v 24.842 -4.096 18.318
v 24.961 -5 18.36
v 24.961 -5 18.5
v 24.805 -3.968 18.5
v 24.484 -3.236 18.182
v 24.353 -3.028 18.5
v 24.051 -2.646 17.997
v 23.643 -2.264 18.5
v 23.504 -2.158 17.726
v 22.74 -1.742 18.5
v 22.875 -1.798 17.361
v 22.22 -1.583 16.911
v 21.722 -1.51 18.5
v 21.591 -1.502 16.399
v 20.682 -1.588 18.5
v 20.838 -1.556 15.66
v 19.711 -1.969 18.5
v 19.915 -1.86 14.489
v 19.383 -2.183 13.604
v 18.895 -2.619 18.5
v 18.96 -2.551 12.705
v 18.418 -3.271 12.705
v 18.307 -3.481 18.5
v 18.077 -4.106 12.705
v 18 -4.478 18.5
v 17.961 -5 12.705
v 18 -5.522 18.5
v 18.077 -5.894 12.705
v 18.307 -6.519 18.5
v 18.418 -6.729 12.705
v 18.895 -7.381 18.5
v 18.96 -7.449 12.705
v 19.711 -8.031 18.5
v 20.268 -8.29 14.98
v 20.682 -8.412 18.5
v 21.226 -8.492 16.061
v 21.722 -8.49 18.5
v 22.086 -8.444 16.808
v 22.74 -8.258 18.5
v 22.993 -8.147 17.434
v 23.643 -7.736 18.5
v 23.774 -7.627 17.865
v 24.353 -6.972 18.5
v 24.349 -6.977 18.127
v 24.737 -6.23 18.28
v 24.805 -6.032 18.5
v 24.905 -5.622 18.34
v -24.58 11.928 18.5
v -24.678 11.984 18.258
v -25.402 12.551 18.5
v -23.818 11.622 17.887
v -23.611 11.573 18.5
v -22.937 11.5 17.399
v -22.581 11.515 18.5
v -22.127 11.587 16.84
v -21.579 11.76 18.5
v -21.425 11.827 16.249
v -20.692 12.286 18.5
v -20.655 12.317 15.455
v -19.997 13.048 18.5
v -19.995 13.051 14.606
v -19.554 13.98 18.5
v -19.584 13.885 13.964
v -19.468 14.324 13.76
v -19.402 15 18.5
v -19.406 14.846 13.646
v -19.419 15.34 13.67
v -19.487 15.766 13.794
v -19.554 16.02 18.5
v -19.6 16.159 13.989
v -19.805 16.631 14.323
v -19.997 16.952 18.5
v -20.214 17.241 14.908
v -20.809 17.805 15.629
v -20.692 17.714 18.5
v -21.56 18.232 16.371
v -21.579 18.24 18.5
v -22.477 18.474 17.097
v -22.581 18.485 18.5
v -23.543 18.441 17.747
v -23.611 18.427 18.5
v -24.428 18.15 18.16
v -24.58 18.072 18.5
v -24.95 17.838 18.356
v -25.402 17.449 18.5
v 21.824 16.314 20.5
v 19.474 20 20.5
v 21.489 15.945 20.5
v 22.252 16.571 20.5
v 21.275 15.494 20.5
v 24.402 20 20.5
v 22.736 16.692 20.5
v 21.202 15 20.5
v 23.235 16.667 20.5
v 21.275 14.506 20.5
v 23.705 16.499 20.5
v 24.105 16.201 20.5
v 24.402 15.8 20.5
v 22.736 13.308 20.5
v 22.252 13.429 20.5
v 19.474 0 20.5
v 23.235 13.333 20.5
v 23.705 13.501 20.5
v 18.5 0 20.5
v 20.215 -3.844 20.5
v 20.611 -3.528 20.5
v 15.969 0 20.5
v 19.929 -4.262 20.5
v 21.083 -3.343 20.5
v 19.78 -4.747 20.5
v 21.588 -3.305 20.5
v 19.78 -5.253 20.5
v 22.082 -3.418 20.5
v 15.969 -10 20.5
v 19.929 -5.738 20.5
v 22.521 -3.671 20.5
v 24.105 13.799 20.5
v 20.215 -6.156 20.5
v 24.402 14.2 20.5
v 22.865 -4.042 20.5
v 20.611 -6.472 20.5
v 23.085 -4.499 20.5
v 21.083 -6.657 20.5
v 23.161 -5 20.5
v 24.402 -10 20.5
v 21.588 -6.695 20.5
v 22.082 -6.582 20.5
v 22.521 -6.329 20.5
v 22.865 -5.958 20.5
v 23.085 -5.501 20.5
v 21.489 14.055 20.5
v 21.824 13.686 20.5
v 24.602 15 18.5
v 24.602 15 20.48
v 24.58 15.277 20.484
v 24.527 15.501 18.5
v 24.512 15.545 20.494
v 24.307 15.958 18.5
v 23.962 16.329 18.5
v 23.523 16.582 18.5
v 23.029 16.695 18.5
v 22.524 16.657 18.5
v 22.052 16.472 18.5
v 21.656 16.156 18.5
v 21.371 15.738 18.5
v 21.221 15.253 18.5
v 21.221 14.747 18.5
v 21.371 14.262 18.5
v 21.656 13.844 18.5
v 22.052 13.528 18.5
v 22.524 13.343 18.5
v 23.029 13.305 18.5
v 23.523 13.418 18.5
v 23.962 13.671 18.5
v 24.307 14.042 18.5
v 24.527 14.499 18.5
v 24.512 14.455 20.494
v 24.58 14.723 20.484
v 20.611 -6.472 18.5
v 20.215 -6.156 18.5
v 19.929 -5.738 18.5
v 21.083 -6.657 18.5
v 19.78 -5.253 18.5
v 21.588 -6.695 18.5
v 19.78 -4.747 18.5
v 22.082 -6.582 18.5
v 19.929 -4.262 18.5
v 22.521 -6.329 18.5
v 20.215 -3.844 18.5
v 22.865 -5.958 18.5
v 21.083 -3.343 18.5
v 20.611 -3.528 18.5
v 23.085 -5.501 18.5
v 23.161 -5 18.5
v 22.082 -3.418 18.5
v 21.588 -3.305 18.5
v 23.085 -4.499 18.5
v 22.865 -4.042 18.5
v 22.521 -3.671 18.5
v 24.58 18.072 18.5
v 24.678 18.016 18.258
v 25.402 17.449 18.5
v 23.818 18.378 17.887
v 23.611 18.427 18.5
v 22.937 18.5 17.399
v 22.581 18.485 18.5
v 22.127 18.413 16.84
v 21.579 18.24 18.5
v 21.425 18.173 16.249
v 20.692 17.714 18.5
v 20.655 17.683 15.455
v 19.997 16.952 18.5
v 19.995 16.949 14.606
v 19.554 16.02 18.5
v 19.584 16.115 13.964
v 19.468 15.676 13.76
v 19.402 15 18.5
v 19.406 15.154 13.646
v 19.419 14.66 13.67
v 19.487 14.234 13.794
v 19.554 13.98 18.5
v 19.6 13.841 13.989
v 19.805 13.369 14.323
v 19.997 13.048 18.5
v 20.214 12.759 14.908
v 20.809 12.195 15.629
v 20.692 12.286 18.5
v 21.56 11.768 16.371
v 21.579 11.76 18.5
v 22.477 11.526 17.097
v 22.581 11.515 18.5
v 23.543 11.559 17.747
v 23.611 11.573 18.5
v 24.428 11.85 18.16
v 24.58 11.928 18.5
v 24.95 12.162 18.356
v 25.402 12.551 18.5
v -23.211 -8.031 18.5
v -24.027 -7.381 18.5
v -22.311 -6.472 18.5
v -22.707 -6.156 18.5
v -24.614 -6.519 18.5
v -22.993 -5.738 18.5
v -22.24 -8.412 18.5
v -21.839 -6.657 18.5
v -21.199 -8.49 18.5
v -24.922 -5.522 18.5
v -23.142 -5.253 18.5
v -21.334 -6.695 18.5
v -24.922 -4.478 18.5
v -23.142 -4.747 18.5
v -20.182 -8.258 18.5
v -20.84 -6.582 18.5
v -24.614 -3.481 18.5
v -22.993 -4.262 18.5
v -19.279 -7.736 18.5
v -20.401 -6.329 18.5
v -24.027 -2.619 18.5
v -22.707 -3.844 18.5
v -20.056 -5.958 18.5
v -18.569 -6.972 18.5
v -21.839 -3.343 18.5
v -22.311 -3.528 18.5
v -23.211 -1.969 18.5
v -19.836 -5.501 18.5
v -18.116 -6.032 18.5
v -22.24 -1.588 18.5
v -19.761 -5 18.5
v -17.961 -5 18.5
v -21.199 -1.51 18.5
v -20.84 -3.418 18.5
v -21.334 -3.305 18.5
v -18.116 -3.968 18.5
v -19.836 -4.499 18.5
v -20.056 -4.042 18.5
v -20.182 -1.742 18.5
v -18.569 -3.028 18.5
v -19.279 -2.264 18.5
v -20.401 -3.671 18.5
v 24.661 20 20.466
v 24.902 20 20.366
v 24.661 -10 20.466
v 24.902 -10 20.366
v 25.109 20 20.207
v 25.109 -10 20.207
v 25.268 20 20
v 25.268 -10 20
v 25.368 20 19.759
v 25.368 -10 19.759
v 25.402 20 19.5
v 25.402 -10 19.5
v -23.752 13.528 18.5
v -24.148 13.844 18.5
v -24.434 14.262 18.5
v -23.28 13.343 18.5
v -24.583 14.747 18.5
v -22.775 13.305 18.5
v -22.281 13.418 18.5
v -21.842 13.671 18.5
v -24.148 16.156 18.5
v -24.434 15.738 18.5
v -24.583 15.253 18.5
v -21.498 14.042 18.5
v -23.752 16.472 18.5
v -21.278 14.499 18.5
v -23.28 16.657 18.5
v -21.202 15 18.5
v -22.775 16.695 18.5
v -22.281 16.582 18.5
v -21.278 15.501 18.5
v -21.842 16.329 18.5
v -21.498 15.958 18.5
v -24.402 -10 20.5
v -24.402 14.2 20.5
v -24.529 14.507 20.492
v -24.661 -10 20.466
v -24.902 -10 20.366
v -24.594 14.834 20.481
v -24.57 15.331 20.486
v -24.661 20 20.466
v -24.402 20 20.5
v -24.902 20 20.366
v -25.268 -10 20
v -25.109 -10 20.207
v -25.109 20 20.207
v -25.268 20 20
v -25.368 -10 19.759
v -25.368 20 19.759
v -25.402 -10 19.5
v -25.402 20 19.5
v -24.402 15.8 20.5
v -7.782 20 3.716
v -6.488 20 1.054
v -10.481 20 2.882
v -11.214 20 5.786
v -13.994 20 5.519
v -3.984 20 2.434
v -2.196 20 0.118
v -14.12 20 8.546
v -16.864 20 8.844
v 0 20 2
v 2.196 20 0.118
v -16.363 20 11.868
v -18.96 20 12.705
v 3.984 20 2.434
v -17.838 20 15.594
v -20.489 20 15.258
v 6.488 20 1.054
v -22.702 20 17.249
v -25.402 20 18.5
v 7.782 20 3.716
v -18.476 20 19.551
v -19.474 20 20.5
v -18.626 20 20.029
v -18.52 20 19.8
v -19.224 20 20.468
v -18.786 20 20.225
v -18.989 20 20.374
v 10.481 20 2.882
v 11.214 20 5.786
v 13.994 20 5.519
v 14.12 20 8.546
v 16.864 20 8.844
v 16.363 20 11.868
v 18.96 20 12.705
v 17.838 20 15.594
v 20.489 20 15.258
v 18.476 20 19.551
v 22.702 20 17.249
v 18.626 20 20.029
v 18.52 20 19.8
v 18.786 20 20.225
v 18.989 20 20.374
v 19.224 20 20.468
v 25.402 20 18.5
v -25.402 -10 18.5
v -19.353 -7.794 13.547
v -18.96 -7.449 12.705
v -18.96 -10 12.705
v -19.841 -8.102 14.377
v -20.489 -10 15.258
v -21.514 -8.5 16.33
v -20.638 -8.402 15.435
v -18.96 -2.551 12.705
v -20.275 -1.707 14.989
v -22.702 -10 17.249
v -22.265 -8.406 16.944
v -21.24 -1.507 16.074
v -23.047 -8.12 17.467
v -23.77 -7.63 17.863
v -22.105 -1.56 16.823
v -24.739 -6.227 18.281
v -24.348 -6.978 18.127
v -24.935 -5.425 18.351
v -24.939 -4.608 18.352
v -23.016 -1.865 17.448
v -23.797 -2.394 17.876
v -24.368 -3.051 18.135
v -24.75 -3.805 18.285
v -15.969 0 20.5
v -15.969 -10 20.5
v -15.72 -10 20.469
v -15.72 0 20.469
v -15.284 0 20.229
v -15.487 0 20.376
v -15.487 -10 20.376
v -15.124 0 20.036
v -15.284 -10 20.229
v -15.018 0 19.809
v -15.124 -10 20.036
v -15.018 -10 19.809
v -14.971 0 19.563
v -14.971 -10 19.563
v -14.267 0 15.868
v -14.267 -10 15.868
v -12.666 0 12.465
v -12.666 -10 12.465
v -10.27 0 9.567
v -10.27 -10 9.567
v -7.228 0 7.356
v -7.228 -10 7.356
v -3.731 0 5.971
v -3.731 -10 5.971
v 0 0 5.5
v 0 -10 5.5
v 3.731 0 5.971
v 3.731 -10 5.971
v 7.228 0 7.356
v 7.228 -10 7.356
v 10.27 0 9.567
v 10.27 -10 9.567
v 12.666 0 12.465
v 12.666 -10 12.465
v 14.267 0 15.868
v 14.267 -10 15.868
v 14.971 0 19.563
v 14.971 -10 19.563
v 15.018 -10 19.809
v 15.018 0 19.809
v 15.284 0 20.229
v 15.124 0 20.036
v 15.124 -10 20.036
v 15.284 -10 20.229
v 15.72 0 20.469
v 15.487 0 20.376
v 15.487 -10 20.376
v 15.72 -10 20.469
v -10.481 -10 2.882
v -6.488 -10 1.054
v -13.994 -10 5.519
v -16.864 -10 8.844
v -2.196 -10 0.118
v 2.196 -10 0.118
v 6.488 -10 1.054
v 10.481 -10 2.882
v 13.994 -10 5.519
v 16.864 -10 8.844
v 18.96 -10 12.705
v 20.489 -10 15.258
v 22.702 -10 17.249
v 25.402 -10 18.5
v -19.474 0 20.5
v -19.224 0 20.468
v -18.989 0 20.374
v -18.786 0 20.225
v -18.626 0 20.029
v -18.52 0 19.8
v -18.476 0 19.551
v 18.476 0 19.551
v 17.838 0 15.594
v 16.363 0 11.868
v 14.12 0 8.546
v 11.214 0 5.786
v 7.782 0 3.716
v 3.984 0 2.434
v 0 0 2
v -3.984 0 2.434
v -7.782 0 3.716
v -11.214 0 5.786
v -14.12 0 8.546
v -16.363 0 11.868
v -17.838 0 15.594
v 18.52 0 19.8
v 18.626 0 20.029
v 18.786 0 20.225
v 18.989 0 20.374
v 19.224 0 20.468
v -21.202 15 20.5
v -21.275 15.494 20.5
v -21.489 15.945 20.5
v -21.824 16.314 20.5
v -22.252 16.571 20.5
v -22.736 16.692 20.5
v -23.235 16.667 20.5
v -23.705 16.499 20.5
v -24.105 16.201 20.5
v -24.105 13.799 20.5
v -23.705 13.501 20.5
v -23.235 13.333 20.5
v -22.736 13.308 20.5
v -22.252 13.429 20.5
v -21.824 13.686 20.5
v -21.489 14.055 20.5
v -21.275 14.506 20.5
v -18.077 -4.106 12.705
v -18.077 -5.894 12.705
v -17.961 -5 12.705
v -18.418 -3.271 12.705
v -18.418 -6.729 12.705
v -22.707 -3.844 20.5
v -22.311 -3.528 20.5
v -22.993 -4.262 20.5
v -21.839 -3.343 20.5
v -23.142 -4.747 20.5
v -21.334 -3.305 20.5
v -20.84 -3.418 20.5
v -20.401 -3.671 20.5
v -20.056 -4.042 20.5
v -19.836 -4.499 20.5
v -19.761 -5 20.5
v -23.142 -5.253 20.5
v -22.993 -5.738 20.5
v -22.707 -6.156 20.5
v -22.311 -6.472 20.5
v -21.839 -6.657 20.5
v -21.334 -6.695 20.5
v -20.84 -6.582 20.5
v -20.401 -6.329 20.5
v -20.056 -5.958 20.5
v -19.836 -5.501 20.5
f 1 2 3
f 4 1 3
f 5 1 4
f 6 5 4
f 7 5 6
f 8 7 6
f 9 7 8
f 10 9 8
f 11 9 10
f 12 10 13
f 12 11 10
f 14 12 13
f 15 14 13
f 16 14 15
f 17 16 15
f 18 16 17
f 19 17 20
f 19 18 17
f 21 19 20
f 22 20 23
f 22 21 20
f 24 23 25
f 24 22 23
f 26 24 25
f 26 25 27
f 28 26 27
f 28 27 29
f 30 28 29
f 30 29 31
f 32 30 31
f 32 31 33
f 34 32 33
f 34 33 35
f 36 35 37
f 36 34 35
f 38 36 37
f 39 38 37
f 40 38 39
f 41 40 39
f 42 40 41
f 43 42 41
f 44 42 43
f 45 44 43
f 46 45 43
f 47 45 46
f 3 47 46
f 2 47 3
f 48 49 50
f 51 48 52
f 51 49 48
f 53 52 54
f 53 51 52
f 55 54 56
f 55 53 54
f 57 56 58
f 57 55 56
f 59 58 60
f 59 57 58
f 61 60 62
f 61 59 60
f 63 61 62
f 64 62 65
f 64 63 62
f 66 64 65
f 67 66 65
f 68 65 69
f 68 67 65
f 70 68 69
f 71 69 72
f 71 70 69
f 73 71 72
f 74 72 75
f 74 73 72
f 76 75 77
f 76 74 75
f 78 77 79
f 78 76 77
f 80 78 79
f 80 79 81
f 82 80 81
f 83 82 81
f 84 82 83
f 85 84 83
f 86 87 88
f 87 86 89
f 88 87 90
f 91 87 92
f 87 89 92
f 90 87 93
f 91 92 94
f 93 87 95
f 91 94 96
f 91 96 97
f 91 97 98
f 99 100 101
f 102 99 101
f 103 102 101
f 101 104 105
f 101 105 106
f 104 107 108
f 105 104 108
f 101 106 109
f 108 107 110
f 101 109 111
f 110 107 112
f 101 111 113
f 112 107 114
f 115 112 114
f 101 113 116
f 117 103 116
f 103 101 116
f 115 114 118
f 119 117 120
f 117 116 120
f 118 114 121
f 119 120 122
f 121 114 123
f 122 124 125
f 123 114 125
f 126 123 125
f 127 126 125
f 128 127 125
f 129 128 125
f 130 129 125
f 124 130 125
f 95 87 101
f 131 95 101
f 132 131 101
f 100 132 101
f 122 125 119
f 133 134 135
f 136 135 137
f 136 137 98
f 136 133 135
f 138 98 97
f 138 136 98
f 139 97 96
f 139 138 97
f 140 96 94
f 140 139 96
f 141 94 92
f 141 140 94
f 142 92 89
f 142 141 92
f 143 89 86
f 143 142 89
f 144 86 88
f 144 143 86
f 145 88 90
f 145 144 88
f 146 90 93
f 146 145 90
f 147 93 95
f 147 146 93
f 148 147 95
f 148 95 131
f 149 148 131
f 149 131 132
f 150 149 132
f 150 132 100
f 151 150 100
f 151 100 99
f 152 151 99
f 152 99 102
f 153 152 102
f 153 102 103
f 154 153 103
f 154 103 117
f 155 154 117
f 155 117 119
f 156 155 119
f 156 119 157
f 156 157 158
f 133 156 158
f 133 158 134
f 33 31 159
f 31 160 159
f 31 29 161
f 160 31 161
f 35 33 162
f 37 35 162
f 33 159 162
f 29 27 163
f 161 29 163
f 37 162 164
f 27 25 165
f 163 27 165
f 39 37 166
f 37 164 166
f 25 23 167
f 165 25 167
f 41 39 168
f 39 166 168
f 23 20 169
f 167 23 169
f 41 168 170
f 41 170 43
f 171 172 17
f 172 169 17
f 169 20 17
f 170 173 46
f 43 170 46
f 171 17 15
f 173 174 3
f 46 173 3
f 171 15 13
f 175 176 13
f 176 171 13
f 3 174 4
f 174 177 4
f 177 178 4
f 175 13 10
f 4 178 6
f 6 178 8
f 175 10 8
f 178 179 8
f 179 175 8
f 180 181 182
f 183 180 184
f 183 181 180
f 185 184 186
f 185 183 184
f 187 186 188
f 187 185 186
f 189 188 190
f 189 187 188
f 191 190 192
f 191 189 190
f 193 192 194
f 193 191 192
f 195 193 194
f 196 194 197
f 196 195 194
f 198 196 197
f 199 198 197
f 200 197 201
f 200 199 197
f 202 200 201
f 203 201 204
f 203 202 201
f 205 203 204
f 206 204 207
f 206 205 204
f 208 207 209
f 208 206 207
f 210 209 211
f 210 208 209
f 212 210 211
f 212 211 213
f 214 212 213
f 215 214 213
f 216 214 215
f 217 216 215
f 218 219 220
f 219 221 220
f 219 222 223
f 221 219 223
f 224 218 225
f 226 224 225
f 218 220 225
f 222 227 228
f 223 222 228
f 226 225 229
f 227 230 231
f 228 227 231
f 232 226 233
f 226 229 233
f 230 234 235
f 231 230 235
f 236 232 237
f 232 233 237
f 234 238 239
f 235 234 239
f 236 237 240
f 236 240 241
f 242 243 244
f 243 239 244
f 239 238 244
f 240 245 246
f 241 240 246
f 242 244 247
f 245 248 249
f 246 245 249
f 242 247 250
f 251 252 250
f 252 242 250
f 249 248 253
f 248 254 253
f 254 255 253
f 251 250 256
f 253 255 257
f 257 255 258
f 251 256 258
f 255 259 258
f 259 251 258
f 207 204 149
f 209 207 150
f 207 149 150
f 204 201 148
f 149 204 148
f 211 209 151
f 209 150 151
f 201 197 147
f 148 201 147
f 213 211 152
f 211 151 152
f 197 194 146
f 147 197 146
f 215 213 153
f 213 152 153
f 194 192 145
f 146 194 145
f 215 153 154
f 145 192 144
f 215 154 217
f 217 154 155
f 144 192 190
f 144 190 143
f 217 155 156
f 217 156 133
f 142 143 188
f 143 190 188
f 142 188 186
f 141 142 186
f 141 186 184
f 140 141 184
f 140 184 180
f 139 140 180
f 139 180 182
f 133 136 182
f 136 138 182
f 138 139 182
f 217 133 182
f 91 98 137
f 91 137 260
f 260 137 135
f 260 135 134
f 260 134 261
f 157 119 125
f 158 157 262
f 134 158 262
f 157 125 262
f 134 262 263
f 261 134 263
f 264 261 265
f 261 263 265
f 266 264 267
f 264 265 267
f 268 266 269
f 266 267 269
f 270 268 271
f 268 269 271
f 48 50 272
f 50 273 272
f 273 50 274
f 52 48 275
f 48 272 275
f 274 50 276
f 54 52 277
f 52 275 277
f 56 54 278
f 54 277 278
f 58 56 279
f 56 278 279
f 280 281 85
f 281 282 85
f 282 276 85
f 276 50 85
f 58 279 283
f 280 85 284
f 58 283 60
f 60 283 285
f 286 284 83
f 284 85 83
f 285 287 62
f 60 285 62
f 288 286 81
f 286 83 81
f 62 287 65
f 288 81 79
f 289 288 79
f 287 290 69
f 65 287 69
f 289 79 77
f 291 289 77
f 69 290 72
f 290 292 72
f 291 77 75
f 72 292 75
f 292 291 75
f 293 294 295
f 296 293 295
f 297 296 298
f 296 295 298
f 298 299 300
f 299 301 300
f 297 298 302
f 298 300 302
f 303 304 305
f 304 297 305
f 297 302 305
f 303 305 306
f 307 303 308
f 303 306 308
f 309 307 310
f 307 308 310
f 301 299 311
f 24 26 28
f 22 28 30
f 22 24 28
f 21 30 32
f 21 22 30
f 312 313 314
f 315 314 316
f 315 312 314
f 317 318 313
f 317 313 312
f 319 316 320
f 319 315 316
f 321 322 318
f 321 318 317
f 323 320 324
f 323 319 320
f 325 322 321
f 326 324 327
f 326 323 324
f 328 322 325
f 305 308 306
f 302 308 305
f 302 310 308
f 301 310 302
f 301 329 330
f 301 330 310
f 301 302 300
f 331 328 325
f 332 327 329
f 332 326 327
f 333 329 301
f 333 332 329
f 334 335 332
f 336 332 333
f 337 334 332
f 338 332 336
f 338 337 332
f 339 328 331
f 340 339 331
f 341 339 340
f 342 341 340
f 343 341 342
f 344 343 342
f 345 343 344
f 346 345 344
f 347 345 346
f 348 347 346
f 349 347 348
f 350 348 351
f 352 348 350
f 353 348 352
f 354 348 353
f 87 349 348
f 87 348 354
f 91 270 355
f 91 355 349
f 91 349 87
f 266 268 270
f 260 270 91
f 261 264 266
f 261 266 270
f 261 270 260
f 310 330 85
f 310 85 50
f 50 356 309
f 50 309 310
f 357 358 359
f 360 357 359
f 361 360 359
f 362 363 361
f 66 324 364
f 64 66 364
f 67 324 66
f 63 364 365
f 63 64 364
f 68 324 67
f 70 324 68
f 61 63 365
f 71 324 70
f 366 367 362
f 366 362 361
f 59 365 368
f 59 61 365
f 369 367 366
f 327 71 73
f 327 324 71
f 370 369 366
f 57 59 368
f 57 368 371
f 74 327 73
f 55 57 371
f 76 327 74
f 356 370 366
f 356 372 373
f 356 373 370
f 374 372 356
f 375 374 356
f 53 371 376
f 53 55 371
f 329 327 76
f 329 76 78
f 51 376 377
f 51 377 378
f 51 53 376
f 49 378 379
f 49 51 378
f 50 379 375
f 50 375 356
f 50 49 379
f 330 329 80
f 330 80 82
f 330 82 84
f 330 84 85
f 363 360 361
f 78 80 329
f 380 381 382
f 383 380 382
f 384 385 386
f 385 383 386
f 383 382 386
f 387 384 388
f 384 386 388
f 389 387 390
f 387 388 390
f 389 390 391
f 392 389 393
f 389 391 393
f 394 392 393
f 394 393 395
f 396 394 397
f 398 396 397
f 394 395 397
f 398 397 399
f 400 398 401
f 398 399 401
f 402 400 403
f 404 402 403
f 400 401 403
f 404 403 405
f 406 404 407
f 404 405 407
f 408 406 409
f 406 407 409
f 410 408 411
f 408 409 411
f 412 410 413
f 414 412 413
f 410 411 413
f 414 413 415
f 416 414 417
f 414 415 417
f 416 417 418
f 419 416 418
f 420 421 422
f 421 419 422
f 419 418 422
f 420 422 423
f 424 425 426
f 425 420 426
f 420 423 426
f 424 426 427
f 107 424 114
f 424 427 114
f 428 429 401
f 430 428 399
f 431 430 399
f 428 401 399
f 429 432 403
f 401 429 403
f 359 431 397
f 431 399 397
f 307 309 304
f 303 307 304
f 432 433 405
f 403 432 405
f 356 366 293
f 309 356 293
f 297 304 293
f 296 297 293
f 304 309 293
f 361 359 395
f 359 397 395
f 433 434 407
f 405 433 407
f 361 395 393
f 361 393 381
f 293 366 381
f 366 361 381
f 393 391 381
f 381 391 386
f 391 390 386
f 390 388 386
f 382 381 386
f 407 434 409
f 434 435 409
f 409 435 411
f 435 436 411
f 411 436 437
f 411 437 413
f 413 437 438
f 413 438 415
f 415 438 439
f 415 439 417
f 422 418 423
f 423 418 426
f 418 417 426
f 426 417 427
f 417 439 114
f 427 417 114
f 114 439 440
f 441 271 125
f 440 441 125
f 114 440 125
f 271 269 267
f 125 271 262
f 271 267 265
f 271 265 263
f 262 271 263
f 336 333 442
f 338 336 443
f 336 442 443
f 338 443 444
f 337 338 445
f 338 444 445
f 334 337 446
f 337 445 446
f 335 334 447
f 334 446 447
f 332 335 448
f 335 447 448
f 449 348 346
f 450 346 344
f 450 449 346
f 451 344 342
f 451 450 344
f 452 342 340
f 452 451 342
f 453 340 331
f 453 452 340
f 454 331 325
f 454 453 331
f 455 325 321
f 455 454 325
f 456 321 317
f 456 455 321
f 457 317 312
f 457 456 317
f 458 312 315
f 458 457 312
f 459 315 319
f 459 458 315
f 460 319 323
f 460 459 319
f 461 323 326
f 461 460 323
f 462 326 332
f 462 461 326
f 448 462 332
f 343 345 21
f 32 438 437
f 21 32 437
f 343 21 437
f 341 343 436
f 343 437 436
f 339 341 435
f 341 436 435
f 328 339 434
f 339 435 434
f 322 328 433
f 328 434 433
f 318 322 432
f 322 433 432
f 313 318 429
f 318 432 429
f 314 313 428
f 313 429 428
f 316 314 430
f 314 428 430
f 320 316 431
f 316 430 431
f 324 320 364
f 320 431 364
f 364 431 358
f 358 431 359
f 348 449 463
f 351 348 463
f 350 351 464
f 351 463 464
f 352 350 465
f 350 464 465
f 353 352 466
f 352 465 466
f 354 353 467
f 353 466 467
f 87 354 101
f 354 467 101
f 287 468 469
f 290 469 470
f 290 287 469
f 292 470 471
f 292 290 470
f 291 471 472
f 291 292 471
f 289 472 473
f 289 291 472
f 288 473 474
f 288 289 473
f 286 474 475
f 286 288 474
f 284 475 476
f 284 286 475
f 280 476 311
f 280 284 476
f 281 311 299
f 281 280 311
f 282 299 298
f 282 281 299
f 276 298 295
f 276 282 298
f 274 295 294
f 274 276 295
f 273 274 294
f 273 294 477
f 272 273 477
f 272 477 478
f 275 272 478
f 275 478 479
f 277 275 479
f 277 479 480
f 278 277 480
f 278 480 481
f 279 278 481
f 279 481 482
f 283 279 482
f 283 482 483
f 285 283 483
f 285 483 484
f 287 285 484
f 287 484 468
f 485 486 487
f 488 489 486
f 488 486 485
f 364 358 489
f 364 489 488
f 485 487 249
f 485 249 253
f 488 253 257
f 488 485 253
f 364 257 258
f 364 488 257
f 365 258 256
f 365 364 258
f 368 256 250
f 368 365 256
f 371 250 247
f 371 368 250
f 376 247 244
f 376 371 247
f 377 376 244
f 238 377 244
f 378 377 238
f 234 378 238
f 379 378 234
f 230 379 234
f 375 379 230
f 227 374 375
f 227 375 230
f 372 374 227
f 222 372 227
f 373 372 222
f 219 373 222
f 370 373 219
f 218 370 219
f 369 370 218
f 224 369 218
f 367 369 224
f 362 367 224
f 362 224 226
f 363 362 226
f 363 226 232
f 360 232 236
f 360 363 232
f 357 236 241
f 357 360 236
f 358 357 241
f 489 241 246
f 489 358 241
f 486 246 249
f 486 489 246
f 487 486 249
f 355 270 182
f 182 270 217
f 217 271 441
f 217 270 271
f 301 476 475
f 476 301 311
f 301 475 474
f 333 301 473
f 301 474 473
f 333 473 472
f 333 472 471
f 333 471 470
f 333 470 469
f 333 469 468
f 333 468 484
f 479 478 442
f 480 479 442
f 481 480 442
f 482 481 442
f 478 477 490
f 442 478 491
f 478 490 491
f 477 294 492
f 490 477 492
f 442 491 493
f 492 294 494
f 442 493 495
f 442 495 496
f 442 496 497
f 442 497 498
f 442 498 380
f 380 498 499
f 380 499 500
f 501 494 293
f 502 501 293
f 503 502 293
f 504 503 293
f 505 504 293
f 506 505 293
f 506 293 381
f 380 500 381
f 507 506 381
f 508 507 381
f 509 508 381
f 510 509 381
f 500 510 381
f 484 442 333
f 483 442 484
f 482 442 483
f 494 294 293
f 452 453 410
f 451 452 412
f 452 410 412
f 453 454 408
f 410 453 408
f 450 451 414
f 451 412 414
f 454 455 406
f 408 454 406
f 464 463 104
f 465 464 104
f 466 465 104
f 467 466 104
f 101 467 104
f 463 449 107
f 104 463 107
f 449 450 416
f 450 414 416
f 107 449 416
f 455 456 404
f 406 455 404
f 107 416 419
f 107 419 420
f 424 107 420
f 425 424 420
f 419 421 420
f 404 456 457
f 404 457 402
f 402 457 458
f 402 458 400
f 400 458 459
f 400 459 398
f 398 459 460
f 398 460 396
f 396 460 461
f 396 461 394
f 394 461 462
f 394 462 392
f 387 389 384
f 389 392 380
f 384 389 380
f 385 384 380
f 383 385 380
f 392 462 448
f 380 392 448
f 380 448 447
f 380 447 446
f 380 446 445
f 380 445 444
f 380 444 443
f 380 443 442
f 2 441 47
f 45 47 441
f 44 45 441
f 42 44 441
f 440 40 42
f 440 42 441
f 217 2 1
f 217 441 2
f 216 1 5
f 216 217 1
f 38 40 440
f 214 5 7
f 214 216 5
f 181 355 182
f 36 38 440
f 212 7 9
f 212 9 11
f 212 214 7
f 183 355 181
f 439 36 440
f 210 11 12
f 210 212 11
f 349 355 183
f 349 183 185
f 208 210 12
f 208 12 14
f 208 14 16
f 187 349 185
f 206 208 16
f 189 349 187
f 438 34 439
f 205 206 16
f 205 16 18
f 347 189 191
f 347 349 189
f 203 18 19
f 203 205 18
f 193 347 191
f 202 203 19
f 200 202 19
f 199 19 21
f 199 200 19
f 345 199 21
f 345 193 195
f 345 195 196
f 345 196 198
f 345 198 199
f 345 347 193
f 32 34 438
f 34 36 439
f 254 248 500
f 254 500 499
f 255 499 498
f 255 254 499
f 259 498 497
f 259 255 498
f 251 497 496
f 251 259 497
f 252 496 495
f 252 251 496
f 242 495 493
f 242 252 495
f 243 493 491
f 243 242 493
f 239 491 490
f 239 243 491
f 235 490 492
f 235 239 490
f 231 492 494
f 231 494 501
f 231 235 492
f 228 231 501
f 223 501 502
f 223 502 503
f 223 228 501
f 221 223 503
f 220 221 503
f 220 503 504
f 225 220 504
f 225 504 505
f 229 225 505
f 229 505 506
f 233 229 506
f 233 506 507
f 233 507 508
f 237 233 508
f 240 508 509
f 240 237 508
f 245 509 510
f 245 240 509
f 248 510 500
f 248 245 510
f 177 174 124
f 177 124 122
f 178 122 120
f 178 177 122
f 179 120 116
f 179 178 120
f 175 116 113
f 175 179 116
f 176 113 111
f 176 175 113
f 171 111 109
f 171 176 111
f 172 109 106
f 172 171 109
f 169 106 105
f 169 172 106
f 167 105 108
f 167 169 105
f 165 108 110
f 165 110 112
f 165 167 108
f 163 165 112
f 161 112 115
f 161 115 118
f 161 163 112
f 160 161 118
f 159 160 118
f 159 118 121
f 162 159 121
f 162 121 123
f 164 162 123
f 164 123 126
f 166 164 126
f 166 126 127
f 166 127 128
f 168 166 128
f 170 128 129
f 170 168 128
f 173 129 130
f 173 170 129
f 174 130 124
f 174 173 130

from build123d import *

# Parameters (mm, degrees)
BOSS_EXTRU_1_DEPTH         = 20
BOSS_EXTRU_2_START         = 10
BOSS_EXTRU_2_DEPTH         = 10
CONG_4_R                   = 10
PER_AGEAVANC_1_START       = 12.70456624
PER_AGEAVANC_1_OUTLINE_R   = 3.5
PER_AGEAVANC_1_DEPTH       = 5.79543376
PER_AGEAVANC_1_START_2     = 18.5
PER_AGEAVANC_1_2_OUTLINE_R = 1.7
PER_AGEAVANC_1_2_DEPTH     = 2
CONG_6_R                   = 1


# Read off the part's stored shape, not the designer's step: PerçageAvancé1
with BuildPart() as part:
    # Esquisse4 → Boss.-Extru.1 (new body)
    with BuildSketch(Plane(origin=(0, 0, 0), x_dir=(1, 0, 0), z_dir=(0, 1, 0))):
        with BuildLine():
            Line((-25.402205763, -20.5), (-25.402205763, -18.5))
            Line((-25.402205763, -18.5), (-20.402205763, -18.5))
            ThreePointArc((-20.402205763, -18.5), (0, 0), (20.402205763, -18.5))
            Line((20.402205763, -18.5), (25.402205763, -18.5))
            Line((25.402205763, -18.5), (25.402205763, -20.5))
            Line((25.402205763, -20.5), (18.5, -20.5))
            ThreePointArc((18.5, -20.5), (0, -2), (-18.5, -20.5))
            Line((-18.5, -20.5), (-25.402205763, -20.5))
        make_face()
    extrude(amount=BOSS_EXTRU_1_DEPTH)

    # Esquisse8 → Boss.-Extru.2 (add)
    with BuildSketch(Plane.XZ.offset(BOSS_EXTRU_2_START)):
        with BuildLine():
            Line((-25.402205763, 20.5), (-15, 20.5))
            ThreePointArc((-15, 20.5), (0, 5.5), (15, 20.5))
            Line((15, 20.5), (25.402205763, 20.5))
            Line((25.402205763, 20.5), (25.402205763, 18.5))
            Line((25.402205763, 18.5), (20.402205763, 18.5))
            ThreePointArc((20.402205763, 18.5), (0, 0), (-20.402205763, 18.5))
            Line((-20.402205763, 18.5), (-25.402205763, 18.5))
            Line((-25.402205763, 18.5), (-25.402205763, 20.5))
        make_face()
    extrude(amount=-BOSS_EXTRU_2_DEPTH)

    # Congé4
    # the kernel refuses this fillet: 10 mm, written as the material it adds along each edge
    with BuildSketch(Plane(origin=(20.402205763, 20, 18.5), x_dir=(1, 0, 0), z_dir=(0, -1, 0))) as cong_4_piece_1:
        with BuildLine():
            CenterArc((7.806559521, -9.598084374), CONG_4_R, 106.29935787, 51.350539993)
            Line((-1.442215982, -5.79543376), (-1.627191492, -5.719380747))
            ThreePointArc((-1.627191492, -5.719380747), (-0.703011933, -2.902220154), (-0.19904591, 0.019512195))
            Line((-0.19904591, 0.019512195), (0, 0.2))
            ThreePointArc((0, 0.2), (2.5, 0.2), (4.94386881, 0.191961687))
            Line((4.94386881, 0.191961687), (5, 0))
        make_face()
    extrude(amount=30)
    with BuildSketch(Plane(origin=(-20.402205763, 20, 18.5), x_dir=(0.241488677516522, 0, -0.9704036369631562), z_dir=(0, -1, 0))) as cong_4_piece_2:
        with BuildLine():
            CenterArc((7.42882025, -9.893342453), CONG_4_R, 98.375682161, 51.350539993)
            Line((-1.207443388, -4.852018185), (-1.38016866, -4.751191699))
            ThreePointArc((-1.38016866, -4.751191699), (-0.797802421, -2.377711357), (-0.194080727, 0.048297736))
            Line((-0.194080727, 0.048297736), (0.029132628, 0.197866849))
            ThreePointArc((0.029132628, 0.197866849), (2.986094414, -0.01864797), (5.9430562, 0.197866849))
            Line((5.9430562, 0.197866849), (5.972188828, 0))
        make_face()
    extrude(amount=30)

    # PerçageAvancé1 outline → PerçageAvancé1 (cut)
    with BuildSketch(Plane.XY.offset(PER_AGEAVANC_1_START)):
        with BuildLine():
            Line((27, 15.818747829), (25.402205763, 17.449489743))
            ThreePointArc((25.402205763, 17.449489743), (19.402205763, 15), (25.402205763, 12.550510257))
            Line((25.402205763, 12.550510257), (27, 14.181252171))
            Line((27, 14.181252171), (27, 15.818747829))
        make_face()
        with BuildLine():
            Line((-25.402205763, 17.449489743), (-27, 15.818747829))
            Line((-27, 15.818747829), (-27, 14.181252171))
            Line((-27, 14.181252171), (-25.402205763, 12.550510257))
            ThreePointArc((-25.402205763, 12.550510257), (-19.402205763, 15), (-25.402205763, 17.449489743))
        make_face()
        with Locations((21.460868066, -5)):
            Circle(PER_AGEAVANC_1_OUTLINE_R)
        with Locations((-21.460868066, -5)):
            Circle(PER_AGEAVANC_1_OUTLINE_R)
    extrude(amount=PER_AGEAVANC_1_DEPTH, mode=Mode.SUBTRACT)

    # Per_ageAvanc_1 2 outline → Per_ageAvanc_1 2 (cut)
    with BuildSketch(Plane.XY.offset(PER_AGEAVANC_1_START_2)):
        with Locations((22.902205763, 15)):
            Circle(PER_AGEAVANC_1_2_OUTLINE_R)
        with Locations((21.460868066, -5)):
            Circle(PER_AGEAVANC_1_2_OUTLINE_R)
        with Locations((-21.460868066, -5)):
            Circle(PER_AGEAVANC_1_2_OUTLINE_R)
        with Locations((-22.902205763, 15)):
            Circle(PER_AGEAVANC_1_2_OUTLINE_R)
    extrude(amount=PER_AGEAVANC_1_2_DEPTH, mode=Mode.SUBTRACT)

    # Congé6
    # the kernel refuses this fillet: 1 mm, written as the material it takes off along each edge
    with BuildSketch(Plane(origin=(25.402205763, -12.5, 20.5), x_dir=(-1, 0, 0), z_dir=(0, 1, 0))) as cong_6_piece_1:
        with BuildLine():
            CenterArc((CONG_6_R, -CONG_6_R), CONG_6_R, 90, 90)
            Line((0, -CONG_6_R), (0, 0))
            Line((0, 0), (CONG_6_R, 0))
        make_face()
    extrude(amount=35, mode=Mode.SUBTRACT)
    with BuildSketch(Plane(origin=(18.5, 0, 20.5), x_dir=(-0.02564946435665691, 0, -0.9996709983680714), z_dir=(0, 1, 0))) as cong_6_piece_2:
        with BuildLine():
            CenterArc((0.974679646, -0.999670998), CONG_6_R, 91.469767243, 87.060465514)
            Line((-0.024991353, -0.974021534), (0, 0))
            ThreePointArc((0, 0), (0.474515091, -0.00608653), (0.949030181, 0))
        make_face()
    extrude(amount=22.435855235, mode=Mode.SUBTRACT)
    with BuildSketch(Plane(origin=(-18.5, 0, 20.5), x_dir=(-1, 0, 0), z_dir=(0, 1, 0))) as cong_6_piece_3:
        with BuildLine():
            CenterArc((0.974342094, -1), CONG_6_R, 90, 87.060465514)
            ThreePointArc((-0.024342116, -0.948717949), (-0.00608653, -0.474515091), (0, 0))
            Line((0, 0), (0.974342094, 0))
        make_face()
    extrude(amount=22.435855235, mode=Mode.SUBTRACT)
    with BuildSketch(Plane(origin=(-25.402205763, 22.5, 20.5), x_dir=(0, 0, -1), z_dir=(0, -1, 0))) as cong_6_piece_4:
        with BuildLine():
            CenterArc((CONG_6_R, CONG_6_R), CONG_6_R, 180, 90)
            Line((0, CONG_6_R), (0, 0))
            Line((0, 0), (CONG_6_R, 0))
        make_face()
    extrude(amount=35, mode=Mode.SUBTRACT)
    with BuildSketch(Plane(origin=(15, -12.421798557, 20.5), x_dir=(1, 0, 0), z_dir=(0, 1, 0))) as cong_6_piece_5:
        with BuildLine():
            CenterArc((0.968719423, 1), CONG_6_R, 183.583321698, 86.416678302)
            ThreePointArc((-0.029325541, 0.9375), (-0.007333178, 0.468979274), (0, 0))
            Line((0, 0), (0.968719423, 0))
        make_face()
    extrude(amount=14.843597113, mode=Mode.SUBTRACT)
    with BuildSketch(Plane(origin=(-15, -12.421798557, 20.5), x_dir=(-1, 0, 0), z_dir=(0, 1, 0))) as cong_6_piece_6:
        with BuildLine():
            CenterArc((0.968719423, -1), CONG_6_R, 90, 86.416678302)
            ThreePointArc((-0.029325541, -0.9375), (-0.007333178, -0.468979274), (0, 0))
            Line((0, 0), (0.968719423, 0))
        make_face()
    extrude(amount=14.843597113, mode=Mode.SUBTRACT)


solid = part.part
